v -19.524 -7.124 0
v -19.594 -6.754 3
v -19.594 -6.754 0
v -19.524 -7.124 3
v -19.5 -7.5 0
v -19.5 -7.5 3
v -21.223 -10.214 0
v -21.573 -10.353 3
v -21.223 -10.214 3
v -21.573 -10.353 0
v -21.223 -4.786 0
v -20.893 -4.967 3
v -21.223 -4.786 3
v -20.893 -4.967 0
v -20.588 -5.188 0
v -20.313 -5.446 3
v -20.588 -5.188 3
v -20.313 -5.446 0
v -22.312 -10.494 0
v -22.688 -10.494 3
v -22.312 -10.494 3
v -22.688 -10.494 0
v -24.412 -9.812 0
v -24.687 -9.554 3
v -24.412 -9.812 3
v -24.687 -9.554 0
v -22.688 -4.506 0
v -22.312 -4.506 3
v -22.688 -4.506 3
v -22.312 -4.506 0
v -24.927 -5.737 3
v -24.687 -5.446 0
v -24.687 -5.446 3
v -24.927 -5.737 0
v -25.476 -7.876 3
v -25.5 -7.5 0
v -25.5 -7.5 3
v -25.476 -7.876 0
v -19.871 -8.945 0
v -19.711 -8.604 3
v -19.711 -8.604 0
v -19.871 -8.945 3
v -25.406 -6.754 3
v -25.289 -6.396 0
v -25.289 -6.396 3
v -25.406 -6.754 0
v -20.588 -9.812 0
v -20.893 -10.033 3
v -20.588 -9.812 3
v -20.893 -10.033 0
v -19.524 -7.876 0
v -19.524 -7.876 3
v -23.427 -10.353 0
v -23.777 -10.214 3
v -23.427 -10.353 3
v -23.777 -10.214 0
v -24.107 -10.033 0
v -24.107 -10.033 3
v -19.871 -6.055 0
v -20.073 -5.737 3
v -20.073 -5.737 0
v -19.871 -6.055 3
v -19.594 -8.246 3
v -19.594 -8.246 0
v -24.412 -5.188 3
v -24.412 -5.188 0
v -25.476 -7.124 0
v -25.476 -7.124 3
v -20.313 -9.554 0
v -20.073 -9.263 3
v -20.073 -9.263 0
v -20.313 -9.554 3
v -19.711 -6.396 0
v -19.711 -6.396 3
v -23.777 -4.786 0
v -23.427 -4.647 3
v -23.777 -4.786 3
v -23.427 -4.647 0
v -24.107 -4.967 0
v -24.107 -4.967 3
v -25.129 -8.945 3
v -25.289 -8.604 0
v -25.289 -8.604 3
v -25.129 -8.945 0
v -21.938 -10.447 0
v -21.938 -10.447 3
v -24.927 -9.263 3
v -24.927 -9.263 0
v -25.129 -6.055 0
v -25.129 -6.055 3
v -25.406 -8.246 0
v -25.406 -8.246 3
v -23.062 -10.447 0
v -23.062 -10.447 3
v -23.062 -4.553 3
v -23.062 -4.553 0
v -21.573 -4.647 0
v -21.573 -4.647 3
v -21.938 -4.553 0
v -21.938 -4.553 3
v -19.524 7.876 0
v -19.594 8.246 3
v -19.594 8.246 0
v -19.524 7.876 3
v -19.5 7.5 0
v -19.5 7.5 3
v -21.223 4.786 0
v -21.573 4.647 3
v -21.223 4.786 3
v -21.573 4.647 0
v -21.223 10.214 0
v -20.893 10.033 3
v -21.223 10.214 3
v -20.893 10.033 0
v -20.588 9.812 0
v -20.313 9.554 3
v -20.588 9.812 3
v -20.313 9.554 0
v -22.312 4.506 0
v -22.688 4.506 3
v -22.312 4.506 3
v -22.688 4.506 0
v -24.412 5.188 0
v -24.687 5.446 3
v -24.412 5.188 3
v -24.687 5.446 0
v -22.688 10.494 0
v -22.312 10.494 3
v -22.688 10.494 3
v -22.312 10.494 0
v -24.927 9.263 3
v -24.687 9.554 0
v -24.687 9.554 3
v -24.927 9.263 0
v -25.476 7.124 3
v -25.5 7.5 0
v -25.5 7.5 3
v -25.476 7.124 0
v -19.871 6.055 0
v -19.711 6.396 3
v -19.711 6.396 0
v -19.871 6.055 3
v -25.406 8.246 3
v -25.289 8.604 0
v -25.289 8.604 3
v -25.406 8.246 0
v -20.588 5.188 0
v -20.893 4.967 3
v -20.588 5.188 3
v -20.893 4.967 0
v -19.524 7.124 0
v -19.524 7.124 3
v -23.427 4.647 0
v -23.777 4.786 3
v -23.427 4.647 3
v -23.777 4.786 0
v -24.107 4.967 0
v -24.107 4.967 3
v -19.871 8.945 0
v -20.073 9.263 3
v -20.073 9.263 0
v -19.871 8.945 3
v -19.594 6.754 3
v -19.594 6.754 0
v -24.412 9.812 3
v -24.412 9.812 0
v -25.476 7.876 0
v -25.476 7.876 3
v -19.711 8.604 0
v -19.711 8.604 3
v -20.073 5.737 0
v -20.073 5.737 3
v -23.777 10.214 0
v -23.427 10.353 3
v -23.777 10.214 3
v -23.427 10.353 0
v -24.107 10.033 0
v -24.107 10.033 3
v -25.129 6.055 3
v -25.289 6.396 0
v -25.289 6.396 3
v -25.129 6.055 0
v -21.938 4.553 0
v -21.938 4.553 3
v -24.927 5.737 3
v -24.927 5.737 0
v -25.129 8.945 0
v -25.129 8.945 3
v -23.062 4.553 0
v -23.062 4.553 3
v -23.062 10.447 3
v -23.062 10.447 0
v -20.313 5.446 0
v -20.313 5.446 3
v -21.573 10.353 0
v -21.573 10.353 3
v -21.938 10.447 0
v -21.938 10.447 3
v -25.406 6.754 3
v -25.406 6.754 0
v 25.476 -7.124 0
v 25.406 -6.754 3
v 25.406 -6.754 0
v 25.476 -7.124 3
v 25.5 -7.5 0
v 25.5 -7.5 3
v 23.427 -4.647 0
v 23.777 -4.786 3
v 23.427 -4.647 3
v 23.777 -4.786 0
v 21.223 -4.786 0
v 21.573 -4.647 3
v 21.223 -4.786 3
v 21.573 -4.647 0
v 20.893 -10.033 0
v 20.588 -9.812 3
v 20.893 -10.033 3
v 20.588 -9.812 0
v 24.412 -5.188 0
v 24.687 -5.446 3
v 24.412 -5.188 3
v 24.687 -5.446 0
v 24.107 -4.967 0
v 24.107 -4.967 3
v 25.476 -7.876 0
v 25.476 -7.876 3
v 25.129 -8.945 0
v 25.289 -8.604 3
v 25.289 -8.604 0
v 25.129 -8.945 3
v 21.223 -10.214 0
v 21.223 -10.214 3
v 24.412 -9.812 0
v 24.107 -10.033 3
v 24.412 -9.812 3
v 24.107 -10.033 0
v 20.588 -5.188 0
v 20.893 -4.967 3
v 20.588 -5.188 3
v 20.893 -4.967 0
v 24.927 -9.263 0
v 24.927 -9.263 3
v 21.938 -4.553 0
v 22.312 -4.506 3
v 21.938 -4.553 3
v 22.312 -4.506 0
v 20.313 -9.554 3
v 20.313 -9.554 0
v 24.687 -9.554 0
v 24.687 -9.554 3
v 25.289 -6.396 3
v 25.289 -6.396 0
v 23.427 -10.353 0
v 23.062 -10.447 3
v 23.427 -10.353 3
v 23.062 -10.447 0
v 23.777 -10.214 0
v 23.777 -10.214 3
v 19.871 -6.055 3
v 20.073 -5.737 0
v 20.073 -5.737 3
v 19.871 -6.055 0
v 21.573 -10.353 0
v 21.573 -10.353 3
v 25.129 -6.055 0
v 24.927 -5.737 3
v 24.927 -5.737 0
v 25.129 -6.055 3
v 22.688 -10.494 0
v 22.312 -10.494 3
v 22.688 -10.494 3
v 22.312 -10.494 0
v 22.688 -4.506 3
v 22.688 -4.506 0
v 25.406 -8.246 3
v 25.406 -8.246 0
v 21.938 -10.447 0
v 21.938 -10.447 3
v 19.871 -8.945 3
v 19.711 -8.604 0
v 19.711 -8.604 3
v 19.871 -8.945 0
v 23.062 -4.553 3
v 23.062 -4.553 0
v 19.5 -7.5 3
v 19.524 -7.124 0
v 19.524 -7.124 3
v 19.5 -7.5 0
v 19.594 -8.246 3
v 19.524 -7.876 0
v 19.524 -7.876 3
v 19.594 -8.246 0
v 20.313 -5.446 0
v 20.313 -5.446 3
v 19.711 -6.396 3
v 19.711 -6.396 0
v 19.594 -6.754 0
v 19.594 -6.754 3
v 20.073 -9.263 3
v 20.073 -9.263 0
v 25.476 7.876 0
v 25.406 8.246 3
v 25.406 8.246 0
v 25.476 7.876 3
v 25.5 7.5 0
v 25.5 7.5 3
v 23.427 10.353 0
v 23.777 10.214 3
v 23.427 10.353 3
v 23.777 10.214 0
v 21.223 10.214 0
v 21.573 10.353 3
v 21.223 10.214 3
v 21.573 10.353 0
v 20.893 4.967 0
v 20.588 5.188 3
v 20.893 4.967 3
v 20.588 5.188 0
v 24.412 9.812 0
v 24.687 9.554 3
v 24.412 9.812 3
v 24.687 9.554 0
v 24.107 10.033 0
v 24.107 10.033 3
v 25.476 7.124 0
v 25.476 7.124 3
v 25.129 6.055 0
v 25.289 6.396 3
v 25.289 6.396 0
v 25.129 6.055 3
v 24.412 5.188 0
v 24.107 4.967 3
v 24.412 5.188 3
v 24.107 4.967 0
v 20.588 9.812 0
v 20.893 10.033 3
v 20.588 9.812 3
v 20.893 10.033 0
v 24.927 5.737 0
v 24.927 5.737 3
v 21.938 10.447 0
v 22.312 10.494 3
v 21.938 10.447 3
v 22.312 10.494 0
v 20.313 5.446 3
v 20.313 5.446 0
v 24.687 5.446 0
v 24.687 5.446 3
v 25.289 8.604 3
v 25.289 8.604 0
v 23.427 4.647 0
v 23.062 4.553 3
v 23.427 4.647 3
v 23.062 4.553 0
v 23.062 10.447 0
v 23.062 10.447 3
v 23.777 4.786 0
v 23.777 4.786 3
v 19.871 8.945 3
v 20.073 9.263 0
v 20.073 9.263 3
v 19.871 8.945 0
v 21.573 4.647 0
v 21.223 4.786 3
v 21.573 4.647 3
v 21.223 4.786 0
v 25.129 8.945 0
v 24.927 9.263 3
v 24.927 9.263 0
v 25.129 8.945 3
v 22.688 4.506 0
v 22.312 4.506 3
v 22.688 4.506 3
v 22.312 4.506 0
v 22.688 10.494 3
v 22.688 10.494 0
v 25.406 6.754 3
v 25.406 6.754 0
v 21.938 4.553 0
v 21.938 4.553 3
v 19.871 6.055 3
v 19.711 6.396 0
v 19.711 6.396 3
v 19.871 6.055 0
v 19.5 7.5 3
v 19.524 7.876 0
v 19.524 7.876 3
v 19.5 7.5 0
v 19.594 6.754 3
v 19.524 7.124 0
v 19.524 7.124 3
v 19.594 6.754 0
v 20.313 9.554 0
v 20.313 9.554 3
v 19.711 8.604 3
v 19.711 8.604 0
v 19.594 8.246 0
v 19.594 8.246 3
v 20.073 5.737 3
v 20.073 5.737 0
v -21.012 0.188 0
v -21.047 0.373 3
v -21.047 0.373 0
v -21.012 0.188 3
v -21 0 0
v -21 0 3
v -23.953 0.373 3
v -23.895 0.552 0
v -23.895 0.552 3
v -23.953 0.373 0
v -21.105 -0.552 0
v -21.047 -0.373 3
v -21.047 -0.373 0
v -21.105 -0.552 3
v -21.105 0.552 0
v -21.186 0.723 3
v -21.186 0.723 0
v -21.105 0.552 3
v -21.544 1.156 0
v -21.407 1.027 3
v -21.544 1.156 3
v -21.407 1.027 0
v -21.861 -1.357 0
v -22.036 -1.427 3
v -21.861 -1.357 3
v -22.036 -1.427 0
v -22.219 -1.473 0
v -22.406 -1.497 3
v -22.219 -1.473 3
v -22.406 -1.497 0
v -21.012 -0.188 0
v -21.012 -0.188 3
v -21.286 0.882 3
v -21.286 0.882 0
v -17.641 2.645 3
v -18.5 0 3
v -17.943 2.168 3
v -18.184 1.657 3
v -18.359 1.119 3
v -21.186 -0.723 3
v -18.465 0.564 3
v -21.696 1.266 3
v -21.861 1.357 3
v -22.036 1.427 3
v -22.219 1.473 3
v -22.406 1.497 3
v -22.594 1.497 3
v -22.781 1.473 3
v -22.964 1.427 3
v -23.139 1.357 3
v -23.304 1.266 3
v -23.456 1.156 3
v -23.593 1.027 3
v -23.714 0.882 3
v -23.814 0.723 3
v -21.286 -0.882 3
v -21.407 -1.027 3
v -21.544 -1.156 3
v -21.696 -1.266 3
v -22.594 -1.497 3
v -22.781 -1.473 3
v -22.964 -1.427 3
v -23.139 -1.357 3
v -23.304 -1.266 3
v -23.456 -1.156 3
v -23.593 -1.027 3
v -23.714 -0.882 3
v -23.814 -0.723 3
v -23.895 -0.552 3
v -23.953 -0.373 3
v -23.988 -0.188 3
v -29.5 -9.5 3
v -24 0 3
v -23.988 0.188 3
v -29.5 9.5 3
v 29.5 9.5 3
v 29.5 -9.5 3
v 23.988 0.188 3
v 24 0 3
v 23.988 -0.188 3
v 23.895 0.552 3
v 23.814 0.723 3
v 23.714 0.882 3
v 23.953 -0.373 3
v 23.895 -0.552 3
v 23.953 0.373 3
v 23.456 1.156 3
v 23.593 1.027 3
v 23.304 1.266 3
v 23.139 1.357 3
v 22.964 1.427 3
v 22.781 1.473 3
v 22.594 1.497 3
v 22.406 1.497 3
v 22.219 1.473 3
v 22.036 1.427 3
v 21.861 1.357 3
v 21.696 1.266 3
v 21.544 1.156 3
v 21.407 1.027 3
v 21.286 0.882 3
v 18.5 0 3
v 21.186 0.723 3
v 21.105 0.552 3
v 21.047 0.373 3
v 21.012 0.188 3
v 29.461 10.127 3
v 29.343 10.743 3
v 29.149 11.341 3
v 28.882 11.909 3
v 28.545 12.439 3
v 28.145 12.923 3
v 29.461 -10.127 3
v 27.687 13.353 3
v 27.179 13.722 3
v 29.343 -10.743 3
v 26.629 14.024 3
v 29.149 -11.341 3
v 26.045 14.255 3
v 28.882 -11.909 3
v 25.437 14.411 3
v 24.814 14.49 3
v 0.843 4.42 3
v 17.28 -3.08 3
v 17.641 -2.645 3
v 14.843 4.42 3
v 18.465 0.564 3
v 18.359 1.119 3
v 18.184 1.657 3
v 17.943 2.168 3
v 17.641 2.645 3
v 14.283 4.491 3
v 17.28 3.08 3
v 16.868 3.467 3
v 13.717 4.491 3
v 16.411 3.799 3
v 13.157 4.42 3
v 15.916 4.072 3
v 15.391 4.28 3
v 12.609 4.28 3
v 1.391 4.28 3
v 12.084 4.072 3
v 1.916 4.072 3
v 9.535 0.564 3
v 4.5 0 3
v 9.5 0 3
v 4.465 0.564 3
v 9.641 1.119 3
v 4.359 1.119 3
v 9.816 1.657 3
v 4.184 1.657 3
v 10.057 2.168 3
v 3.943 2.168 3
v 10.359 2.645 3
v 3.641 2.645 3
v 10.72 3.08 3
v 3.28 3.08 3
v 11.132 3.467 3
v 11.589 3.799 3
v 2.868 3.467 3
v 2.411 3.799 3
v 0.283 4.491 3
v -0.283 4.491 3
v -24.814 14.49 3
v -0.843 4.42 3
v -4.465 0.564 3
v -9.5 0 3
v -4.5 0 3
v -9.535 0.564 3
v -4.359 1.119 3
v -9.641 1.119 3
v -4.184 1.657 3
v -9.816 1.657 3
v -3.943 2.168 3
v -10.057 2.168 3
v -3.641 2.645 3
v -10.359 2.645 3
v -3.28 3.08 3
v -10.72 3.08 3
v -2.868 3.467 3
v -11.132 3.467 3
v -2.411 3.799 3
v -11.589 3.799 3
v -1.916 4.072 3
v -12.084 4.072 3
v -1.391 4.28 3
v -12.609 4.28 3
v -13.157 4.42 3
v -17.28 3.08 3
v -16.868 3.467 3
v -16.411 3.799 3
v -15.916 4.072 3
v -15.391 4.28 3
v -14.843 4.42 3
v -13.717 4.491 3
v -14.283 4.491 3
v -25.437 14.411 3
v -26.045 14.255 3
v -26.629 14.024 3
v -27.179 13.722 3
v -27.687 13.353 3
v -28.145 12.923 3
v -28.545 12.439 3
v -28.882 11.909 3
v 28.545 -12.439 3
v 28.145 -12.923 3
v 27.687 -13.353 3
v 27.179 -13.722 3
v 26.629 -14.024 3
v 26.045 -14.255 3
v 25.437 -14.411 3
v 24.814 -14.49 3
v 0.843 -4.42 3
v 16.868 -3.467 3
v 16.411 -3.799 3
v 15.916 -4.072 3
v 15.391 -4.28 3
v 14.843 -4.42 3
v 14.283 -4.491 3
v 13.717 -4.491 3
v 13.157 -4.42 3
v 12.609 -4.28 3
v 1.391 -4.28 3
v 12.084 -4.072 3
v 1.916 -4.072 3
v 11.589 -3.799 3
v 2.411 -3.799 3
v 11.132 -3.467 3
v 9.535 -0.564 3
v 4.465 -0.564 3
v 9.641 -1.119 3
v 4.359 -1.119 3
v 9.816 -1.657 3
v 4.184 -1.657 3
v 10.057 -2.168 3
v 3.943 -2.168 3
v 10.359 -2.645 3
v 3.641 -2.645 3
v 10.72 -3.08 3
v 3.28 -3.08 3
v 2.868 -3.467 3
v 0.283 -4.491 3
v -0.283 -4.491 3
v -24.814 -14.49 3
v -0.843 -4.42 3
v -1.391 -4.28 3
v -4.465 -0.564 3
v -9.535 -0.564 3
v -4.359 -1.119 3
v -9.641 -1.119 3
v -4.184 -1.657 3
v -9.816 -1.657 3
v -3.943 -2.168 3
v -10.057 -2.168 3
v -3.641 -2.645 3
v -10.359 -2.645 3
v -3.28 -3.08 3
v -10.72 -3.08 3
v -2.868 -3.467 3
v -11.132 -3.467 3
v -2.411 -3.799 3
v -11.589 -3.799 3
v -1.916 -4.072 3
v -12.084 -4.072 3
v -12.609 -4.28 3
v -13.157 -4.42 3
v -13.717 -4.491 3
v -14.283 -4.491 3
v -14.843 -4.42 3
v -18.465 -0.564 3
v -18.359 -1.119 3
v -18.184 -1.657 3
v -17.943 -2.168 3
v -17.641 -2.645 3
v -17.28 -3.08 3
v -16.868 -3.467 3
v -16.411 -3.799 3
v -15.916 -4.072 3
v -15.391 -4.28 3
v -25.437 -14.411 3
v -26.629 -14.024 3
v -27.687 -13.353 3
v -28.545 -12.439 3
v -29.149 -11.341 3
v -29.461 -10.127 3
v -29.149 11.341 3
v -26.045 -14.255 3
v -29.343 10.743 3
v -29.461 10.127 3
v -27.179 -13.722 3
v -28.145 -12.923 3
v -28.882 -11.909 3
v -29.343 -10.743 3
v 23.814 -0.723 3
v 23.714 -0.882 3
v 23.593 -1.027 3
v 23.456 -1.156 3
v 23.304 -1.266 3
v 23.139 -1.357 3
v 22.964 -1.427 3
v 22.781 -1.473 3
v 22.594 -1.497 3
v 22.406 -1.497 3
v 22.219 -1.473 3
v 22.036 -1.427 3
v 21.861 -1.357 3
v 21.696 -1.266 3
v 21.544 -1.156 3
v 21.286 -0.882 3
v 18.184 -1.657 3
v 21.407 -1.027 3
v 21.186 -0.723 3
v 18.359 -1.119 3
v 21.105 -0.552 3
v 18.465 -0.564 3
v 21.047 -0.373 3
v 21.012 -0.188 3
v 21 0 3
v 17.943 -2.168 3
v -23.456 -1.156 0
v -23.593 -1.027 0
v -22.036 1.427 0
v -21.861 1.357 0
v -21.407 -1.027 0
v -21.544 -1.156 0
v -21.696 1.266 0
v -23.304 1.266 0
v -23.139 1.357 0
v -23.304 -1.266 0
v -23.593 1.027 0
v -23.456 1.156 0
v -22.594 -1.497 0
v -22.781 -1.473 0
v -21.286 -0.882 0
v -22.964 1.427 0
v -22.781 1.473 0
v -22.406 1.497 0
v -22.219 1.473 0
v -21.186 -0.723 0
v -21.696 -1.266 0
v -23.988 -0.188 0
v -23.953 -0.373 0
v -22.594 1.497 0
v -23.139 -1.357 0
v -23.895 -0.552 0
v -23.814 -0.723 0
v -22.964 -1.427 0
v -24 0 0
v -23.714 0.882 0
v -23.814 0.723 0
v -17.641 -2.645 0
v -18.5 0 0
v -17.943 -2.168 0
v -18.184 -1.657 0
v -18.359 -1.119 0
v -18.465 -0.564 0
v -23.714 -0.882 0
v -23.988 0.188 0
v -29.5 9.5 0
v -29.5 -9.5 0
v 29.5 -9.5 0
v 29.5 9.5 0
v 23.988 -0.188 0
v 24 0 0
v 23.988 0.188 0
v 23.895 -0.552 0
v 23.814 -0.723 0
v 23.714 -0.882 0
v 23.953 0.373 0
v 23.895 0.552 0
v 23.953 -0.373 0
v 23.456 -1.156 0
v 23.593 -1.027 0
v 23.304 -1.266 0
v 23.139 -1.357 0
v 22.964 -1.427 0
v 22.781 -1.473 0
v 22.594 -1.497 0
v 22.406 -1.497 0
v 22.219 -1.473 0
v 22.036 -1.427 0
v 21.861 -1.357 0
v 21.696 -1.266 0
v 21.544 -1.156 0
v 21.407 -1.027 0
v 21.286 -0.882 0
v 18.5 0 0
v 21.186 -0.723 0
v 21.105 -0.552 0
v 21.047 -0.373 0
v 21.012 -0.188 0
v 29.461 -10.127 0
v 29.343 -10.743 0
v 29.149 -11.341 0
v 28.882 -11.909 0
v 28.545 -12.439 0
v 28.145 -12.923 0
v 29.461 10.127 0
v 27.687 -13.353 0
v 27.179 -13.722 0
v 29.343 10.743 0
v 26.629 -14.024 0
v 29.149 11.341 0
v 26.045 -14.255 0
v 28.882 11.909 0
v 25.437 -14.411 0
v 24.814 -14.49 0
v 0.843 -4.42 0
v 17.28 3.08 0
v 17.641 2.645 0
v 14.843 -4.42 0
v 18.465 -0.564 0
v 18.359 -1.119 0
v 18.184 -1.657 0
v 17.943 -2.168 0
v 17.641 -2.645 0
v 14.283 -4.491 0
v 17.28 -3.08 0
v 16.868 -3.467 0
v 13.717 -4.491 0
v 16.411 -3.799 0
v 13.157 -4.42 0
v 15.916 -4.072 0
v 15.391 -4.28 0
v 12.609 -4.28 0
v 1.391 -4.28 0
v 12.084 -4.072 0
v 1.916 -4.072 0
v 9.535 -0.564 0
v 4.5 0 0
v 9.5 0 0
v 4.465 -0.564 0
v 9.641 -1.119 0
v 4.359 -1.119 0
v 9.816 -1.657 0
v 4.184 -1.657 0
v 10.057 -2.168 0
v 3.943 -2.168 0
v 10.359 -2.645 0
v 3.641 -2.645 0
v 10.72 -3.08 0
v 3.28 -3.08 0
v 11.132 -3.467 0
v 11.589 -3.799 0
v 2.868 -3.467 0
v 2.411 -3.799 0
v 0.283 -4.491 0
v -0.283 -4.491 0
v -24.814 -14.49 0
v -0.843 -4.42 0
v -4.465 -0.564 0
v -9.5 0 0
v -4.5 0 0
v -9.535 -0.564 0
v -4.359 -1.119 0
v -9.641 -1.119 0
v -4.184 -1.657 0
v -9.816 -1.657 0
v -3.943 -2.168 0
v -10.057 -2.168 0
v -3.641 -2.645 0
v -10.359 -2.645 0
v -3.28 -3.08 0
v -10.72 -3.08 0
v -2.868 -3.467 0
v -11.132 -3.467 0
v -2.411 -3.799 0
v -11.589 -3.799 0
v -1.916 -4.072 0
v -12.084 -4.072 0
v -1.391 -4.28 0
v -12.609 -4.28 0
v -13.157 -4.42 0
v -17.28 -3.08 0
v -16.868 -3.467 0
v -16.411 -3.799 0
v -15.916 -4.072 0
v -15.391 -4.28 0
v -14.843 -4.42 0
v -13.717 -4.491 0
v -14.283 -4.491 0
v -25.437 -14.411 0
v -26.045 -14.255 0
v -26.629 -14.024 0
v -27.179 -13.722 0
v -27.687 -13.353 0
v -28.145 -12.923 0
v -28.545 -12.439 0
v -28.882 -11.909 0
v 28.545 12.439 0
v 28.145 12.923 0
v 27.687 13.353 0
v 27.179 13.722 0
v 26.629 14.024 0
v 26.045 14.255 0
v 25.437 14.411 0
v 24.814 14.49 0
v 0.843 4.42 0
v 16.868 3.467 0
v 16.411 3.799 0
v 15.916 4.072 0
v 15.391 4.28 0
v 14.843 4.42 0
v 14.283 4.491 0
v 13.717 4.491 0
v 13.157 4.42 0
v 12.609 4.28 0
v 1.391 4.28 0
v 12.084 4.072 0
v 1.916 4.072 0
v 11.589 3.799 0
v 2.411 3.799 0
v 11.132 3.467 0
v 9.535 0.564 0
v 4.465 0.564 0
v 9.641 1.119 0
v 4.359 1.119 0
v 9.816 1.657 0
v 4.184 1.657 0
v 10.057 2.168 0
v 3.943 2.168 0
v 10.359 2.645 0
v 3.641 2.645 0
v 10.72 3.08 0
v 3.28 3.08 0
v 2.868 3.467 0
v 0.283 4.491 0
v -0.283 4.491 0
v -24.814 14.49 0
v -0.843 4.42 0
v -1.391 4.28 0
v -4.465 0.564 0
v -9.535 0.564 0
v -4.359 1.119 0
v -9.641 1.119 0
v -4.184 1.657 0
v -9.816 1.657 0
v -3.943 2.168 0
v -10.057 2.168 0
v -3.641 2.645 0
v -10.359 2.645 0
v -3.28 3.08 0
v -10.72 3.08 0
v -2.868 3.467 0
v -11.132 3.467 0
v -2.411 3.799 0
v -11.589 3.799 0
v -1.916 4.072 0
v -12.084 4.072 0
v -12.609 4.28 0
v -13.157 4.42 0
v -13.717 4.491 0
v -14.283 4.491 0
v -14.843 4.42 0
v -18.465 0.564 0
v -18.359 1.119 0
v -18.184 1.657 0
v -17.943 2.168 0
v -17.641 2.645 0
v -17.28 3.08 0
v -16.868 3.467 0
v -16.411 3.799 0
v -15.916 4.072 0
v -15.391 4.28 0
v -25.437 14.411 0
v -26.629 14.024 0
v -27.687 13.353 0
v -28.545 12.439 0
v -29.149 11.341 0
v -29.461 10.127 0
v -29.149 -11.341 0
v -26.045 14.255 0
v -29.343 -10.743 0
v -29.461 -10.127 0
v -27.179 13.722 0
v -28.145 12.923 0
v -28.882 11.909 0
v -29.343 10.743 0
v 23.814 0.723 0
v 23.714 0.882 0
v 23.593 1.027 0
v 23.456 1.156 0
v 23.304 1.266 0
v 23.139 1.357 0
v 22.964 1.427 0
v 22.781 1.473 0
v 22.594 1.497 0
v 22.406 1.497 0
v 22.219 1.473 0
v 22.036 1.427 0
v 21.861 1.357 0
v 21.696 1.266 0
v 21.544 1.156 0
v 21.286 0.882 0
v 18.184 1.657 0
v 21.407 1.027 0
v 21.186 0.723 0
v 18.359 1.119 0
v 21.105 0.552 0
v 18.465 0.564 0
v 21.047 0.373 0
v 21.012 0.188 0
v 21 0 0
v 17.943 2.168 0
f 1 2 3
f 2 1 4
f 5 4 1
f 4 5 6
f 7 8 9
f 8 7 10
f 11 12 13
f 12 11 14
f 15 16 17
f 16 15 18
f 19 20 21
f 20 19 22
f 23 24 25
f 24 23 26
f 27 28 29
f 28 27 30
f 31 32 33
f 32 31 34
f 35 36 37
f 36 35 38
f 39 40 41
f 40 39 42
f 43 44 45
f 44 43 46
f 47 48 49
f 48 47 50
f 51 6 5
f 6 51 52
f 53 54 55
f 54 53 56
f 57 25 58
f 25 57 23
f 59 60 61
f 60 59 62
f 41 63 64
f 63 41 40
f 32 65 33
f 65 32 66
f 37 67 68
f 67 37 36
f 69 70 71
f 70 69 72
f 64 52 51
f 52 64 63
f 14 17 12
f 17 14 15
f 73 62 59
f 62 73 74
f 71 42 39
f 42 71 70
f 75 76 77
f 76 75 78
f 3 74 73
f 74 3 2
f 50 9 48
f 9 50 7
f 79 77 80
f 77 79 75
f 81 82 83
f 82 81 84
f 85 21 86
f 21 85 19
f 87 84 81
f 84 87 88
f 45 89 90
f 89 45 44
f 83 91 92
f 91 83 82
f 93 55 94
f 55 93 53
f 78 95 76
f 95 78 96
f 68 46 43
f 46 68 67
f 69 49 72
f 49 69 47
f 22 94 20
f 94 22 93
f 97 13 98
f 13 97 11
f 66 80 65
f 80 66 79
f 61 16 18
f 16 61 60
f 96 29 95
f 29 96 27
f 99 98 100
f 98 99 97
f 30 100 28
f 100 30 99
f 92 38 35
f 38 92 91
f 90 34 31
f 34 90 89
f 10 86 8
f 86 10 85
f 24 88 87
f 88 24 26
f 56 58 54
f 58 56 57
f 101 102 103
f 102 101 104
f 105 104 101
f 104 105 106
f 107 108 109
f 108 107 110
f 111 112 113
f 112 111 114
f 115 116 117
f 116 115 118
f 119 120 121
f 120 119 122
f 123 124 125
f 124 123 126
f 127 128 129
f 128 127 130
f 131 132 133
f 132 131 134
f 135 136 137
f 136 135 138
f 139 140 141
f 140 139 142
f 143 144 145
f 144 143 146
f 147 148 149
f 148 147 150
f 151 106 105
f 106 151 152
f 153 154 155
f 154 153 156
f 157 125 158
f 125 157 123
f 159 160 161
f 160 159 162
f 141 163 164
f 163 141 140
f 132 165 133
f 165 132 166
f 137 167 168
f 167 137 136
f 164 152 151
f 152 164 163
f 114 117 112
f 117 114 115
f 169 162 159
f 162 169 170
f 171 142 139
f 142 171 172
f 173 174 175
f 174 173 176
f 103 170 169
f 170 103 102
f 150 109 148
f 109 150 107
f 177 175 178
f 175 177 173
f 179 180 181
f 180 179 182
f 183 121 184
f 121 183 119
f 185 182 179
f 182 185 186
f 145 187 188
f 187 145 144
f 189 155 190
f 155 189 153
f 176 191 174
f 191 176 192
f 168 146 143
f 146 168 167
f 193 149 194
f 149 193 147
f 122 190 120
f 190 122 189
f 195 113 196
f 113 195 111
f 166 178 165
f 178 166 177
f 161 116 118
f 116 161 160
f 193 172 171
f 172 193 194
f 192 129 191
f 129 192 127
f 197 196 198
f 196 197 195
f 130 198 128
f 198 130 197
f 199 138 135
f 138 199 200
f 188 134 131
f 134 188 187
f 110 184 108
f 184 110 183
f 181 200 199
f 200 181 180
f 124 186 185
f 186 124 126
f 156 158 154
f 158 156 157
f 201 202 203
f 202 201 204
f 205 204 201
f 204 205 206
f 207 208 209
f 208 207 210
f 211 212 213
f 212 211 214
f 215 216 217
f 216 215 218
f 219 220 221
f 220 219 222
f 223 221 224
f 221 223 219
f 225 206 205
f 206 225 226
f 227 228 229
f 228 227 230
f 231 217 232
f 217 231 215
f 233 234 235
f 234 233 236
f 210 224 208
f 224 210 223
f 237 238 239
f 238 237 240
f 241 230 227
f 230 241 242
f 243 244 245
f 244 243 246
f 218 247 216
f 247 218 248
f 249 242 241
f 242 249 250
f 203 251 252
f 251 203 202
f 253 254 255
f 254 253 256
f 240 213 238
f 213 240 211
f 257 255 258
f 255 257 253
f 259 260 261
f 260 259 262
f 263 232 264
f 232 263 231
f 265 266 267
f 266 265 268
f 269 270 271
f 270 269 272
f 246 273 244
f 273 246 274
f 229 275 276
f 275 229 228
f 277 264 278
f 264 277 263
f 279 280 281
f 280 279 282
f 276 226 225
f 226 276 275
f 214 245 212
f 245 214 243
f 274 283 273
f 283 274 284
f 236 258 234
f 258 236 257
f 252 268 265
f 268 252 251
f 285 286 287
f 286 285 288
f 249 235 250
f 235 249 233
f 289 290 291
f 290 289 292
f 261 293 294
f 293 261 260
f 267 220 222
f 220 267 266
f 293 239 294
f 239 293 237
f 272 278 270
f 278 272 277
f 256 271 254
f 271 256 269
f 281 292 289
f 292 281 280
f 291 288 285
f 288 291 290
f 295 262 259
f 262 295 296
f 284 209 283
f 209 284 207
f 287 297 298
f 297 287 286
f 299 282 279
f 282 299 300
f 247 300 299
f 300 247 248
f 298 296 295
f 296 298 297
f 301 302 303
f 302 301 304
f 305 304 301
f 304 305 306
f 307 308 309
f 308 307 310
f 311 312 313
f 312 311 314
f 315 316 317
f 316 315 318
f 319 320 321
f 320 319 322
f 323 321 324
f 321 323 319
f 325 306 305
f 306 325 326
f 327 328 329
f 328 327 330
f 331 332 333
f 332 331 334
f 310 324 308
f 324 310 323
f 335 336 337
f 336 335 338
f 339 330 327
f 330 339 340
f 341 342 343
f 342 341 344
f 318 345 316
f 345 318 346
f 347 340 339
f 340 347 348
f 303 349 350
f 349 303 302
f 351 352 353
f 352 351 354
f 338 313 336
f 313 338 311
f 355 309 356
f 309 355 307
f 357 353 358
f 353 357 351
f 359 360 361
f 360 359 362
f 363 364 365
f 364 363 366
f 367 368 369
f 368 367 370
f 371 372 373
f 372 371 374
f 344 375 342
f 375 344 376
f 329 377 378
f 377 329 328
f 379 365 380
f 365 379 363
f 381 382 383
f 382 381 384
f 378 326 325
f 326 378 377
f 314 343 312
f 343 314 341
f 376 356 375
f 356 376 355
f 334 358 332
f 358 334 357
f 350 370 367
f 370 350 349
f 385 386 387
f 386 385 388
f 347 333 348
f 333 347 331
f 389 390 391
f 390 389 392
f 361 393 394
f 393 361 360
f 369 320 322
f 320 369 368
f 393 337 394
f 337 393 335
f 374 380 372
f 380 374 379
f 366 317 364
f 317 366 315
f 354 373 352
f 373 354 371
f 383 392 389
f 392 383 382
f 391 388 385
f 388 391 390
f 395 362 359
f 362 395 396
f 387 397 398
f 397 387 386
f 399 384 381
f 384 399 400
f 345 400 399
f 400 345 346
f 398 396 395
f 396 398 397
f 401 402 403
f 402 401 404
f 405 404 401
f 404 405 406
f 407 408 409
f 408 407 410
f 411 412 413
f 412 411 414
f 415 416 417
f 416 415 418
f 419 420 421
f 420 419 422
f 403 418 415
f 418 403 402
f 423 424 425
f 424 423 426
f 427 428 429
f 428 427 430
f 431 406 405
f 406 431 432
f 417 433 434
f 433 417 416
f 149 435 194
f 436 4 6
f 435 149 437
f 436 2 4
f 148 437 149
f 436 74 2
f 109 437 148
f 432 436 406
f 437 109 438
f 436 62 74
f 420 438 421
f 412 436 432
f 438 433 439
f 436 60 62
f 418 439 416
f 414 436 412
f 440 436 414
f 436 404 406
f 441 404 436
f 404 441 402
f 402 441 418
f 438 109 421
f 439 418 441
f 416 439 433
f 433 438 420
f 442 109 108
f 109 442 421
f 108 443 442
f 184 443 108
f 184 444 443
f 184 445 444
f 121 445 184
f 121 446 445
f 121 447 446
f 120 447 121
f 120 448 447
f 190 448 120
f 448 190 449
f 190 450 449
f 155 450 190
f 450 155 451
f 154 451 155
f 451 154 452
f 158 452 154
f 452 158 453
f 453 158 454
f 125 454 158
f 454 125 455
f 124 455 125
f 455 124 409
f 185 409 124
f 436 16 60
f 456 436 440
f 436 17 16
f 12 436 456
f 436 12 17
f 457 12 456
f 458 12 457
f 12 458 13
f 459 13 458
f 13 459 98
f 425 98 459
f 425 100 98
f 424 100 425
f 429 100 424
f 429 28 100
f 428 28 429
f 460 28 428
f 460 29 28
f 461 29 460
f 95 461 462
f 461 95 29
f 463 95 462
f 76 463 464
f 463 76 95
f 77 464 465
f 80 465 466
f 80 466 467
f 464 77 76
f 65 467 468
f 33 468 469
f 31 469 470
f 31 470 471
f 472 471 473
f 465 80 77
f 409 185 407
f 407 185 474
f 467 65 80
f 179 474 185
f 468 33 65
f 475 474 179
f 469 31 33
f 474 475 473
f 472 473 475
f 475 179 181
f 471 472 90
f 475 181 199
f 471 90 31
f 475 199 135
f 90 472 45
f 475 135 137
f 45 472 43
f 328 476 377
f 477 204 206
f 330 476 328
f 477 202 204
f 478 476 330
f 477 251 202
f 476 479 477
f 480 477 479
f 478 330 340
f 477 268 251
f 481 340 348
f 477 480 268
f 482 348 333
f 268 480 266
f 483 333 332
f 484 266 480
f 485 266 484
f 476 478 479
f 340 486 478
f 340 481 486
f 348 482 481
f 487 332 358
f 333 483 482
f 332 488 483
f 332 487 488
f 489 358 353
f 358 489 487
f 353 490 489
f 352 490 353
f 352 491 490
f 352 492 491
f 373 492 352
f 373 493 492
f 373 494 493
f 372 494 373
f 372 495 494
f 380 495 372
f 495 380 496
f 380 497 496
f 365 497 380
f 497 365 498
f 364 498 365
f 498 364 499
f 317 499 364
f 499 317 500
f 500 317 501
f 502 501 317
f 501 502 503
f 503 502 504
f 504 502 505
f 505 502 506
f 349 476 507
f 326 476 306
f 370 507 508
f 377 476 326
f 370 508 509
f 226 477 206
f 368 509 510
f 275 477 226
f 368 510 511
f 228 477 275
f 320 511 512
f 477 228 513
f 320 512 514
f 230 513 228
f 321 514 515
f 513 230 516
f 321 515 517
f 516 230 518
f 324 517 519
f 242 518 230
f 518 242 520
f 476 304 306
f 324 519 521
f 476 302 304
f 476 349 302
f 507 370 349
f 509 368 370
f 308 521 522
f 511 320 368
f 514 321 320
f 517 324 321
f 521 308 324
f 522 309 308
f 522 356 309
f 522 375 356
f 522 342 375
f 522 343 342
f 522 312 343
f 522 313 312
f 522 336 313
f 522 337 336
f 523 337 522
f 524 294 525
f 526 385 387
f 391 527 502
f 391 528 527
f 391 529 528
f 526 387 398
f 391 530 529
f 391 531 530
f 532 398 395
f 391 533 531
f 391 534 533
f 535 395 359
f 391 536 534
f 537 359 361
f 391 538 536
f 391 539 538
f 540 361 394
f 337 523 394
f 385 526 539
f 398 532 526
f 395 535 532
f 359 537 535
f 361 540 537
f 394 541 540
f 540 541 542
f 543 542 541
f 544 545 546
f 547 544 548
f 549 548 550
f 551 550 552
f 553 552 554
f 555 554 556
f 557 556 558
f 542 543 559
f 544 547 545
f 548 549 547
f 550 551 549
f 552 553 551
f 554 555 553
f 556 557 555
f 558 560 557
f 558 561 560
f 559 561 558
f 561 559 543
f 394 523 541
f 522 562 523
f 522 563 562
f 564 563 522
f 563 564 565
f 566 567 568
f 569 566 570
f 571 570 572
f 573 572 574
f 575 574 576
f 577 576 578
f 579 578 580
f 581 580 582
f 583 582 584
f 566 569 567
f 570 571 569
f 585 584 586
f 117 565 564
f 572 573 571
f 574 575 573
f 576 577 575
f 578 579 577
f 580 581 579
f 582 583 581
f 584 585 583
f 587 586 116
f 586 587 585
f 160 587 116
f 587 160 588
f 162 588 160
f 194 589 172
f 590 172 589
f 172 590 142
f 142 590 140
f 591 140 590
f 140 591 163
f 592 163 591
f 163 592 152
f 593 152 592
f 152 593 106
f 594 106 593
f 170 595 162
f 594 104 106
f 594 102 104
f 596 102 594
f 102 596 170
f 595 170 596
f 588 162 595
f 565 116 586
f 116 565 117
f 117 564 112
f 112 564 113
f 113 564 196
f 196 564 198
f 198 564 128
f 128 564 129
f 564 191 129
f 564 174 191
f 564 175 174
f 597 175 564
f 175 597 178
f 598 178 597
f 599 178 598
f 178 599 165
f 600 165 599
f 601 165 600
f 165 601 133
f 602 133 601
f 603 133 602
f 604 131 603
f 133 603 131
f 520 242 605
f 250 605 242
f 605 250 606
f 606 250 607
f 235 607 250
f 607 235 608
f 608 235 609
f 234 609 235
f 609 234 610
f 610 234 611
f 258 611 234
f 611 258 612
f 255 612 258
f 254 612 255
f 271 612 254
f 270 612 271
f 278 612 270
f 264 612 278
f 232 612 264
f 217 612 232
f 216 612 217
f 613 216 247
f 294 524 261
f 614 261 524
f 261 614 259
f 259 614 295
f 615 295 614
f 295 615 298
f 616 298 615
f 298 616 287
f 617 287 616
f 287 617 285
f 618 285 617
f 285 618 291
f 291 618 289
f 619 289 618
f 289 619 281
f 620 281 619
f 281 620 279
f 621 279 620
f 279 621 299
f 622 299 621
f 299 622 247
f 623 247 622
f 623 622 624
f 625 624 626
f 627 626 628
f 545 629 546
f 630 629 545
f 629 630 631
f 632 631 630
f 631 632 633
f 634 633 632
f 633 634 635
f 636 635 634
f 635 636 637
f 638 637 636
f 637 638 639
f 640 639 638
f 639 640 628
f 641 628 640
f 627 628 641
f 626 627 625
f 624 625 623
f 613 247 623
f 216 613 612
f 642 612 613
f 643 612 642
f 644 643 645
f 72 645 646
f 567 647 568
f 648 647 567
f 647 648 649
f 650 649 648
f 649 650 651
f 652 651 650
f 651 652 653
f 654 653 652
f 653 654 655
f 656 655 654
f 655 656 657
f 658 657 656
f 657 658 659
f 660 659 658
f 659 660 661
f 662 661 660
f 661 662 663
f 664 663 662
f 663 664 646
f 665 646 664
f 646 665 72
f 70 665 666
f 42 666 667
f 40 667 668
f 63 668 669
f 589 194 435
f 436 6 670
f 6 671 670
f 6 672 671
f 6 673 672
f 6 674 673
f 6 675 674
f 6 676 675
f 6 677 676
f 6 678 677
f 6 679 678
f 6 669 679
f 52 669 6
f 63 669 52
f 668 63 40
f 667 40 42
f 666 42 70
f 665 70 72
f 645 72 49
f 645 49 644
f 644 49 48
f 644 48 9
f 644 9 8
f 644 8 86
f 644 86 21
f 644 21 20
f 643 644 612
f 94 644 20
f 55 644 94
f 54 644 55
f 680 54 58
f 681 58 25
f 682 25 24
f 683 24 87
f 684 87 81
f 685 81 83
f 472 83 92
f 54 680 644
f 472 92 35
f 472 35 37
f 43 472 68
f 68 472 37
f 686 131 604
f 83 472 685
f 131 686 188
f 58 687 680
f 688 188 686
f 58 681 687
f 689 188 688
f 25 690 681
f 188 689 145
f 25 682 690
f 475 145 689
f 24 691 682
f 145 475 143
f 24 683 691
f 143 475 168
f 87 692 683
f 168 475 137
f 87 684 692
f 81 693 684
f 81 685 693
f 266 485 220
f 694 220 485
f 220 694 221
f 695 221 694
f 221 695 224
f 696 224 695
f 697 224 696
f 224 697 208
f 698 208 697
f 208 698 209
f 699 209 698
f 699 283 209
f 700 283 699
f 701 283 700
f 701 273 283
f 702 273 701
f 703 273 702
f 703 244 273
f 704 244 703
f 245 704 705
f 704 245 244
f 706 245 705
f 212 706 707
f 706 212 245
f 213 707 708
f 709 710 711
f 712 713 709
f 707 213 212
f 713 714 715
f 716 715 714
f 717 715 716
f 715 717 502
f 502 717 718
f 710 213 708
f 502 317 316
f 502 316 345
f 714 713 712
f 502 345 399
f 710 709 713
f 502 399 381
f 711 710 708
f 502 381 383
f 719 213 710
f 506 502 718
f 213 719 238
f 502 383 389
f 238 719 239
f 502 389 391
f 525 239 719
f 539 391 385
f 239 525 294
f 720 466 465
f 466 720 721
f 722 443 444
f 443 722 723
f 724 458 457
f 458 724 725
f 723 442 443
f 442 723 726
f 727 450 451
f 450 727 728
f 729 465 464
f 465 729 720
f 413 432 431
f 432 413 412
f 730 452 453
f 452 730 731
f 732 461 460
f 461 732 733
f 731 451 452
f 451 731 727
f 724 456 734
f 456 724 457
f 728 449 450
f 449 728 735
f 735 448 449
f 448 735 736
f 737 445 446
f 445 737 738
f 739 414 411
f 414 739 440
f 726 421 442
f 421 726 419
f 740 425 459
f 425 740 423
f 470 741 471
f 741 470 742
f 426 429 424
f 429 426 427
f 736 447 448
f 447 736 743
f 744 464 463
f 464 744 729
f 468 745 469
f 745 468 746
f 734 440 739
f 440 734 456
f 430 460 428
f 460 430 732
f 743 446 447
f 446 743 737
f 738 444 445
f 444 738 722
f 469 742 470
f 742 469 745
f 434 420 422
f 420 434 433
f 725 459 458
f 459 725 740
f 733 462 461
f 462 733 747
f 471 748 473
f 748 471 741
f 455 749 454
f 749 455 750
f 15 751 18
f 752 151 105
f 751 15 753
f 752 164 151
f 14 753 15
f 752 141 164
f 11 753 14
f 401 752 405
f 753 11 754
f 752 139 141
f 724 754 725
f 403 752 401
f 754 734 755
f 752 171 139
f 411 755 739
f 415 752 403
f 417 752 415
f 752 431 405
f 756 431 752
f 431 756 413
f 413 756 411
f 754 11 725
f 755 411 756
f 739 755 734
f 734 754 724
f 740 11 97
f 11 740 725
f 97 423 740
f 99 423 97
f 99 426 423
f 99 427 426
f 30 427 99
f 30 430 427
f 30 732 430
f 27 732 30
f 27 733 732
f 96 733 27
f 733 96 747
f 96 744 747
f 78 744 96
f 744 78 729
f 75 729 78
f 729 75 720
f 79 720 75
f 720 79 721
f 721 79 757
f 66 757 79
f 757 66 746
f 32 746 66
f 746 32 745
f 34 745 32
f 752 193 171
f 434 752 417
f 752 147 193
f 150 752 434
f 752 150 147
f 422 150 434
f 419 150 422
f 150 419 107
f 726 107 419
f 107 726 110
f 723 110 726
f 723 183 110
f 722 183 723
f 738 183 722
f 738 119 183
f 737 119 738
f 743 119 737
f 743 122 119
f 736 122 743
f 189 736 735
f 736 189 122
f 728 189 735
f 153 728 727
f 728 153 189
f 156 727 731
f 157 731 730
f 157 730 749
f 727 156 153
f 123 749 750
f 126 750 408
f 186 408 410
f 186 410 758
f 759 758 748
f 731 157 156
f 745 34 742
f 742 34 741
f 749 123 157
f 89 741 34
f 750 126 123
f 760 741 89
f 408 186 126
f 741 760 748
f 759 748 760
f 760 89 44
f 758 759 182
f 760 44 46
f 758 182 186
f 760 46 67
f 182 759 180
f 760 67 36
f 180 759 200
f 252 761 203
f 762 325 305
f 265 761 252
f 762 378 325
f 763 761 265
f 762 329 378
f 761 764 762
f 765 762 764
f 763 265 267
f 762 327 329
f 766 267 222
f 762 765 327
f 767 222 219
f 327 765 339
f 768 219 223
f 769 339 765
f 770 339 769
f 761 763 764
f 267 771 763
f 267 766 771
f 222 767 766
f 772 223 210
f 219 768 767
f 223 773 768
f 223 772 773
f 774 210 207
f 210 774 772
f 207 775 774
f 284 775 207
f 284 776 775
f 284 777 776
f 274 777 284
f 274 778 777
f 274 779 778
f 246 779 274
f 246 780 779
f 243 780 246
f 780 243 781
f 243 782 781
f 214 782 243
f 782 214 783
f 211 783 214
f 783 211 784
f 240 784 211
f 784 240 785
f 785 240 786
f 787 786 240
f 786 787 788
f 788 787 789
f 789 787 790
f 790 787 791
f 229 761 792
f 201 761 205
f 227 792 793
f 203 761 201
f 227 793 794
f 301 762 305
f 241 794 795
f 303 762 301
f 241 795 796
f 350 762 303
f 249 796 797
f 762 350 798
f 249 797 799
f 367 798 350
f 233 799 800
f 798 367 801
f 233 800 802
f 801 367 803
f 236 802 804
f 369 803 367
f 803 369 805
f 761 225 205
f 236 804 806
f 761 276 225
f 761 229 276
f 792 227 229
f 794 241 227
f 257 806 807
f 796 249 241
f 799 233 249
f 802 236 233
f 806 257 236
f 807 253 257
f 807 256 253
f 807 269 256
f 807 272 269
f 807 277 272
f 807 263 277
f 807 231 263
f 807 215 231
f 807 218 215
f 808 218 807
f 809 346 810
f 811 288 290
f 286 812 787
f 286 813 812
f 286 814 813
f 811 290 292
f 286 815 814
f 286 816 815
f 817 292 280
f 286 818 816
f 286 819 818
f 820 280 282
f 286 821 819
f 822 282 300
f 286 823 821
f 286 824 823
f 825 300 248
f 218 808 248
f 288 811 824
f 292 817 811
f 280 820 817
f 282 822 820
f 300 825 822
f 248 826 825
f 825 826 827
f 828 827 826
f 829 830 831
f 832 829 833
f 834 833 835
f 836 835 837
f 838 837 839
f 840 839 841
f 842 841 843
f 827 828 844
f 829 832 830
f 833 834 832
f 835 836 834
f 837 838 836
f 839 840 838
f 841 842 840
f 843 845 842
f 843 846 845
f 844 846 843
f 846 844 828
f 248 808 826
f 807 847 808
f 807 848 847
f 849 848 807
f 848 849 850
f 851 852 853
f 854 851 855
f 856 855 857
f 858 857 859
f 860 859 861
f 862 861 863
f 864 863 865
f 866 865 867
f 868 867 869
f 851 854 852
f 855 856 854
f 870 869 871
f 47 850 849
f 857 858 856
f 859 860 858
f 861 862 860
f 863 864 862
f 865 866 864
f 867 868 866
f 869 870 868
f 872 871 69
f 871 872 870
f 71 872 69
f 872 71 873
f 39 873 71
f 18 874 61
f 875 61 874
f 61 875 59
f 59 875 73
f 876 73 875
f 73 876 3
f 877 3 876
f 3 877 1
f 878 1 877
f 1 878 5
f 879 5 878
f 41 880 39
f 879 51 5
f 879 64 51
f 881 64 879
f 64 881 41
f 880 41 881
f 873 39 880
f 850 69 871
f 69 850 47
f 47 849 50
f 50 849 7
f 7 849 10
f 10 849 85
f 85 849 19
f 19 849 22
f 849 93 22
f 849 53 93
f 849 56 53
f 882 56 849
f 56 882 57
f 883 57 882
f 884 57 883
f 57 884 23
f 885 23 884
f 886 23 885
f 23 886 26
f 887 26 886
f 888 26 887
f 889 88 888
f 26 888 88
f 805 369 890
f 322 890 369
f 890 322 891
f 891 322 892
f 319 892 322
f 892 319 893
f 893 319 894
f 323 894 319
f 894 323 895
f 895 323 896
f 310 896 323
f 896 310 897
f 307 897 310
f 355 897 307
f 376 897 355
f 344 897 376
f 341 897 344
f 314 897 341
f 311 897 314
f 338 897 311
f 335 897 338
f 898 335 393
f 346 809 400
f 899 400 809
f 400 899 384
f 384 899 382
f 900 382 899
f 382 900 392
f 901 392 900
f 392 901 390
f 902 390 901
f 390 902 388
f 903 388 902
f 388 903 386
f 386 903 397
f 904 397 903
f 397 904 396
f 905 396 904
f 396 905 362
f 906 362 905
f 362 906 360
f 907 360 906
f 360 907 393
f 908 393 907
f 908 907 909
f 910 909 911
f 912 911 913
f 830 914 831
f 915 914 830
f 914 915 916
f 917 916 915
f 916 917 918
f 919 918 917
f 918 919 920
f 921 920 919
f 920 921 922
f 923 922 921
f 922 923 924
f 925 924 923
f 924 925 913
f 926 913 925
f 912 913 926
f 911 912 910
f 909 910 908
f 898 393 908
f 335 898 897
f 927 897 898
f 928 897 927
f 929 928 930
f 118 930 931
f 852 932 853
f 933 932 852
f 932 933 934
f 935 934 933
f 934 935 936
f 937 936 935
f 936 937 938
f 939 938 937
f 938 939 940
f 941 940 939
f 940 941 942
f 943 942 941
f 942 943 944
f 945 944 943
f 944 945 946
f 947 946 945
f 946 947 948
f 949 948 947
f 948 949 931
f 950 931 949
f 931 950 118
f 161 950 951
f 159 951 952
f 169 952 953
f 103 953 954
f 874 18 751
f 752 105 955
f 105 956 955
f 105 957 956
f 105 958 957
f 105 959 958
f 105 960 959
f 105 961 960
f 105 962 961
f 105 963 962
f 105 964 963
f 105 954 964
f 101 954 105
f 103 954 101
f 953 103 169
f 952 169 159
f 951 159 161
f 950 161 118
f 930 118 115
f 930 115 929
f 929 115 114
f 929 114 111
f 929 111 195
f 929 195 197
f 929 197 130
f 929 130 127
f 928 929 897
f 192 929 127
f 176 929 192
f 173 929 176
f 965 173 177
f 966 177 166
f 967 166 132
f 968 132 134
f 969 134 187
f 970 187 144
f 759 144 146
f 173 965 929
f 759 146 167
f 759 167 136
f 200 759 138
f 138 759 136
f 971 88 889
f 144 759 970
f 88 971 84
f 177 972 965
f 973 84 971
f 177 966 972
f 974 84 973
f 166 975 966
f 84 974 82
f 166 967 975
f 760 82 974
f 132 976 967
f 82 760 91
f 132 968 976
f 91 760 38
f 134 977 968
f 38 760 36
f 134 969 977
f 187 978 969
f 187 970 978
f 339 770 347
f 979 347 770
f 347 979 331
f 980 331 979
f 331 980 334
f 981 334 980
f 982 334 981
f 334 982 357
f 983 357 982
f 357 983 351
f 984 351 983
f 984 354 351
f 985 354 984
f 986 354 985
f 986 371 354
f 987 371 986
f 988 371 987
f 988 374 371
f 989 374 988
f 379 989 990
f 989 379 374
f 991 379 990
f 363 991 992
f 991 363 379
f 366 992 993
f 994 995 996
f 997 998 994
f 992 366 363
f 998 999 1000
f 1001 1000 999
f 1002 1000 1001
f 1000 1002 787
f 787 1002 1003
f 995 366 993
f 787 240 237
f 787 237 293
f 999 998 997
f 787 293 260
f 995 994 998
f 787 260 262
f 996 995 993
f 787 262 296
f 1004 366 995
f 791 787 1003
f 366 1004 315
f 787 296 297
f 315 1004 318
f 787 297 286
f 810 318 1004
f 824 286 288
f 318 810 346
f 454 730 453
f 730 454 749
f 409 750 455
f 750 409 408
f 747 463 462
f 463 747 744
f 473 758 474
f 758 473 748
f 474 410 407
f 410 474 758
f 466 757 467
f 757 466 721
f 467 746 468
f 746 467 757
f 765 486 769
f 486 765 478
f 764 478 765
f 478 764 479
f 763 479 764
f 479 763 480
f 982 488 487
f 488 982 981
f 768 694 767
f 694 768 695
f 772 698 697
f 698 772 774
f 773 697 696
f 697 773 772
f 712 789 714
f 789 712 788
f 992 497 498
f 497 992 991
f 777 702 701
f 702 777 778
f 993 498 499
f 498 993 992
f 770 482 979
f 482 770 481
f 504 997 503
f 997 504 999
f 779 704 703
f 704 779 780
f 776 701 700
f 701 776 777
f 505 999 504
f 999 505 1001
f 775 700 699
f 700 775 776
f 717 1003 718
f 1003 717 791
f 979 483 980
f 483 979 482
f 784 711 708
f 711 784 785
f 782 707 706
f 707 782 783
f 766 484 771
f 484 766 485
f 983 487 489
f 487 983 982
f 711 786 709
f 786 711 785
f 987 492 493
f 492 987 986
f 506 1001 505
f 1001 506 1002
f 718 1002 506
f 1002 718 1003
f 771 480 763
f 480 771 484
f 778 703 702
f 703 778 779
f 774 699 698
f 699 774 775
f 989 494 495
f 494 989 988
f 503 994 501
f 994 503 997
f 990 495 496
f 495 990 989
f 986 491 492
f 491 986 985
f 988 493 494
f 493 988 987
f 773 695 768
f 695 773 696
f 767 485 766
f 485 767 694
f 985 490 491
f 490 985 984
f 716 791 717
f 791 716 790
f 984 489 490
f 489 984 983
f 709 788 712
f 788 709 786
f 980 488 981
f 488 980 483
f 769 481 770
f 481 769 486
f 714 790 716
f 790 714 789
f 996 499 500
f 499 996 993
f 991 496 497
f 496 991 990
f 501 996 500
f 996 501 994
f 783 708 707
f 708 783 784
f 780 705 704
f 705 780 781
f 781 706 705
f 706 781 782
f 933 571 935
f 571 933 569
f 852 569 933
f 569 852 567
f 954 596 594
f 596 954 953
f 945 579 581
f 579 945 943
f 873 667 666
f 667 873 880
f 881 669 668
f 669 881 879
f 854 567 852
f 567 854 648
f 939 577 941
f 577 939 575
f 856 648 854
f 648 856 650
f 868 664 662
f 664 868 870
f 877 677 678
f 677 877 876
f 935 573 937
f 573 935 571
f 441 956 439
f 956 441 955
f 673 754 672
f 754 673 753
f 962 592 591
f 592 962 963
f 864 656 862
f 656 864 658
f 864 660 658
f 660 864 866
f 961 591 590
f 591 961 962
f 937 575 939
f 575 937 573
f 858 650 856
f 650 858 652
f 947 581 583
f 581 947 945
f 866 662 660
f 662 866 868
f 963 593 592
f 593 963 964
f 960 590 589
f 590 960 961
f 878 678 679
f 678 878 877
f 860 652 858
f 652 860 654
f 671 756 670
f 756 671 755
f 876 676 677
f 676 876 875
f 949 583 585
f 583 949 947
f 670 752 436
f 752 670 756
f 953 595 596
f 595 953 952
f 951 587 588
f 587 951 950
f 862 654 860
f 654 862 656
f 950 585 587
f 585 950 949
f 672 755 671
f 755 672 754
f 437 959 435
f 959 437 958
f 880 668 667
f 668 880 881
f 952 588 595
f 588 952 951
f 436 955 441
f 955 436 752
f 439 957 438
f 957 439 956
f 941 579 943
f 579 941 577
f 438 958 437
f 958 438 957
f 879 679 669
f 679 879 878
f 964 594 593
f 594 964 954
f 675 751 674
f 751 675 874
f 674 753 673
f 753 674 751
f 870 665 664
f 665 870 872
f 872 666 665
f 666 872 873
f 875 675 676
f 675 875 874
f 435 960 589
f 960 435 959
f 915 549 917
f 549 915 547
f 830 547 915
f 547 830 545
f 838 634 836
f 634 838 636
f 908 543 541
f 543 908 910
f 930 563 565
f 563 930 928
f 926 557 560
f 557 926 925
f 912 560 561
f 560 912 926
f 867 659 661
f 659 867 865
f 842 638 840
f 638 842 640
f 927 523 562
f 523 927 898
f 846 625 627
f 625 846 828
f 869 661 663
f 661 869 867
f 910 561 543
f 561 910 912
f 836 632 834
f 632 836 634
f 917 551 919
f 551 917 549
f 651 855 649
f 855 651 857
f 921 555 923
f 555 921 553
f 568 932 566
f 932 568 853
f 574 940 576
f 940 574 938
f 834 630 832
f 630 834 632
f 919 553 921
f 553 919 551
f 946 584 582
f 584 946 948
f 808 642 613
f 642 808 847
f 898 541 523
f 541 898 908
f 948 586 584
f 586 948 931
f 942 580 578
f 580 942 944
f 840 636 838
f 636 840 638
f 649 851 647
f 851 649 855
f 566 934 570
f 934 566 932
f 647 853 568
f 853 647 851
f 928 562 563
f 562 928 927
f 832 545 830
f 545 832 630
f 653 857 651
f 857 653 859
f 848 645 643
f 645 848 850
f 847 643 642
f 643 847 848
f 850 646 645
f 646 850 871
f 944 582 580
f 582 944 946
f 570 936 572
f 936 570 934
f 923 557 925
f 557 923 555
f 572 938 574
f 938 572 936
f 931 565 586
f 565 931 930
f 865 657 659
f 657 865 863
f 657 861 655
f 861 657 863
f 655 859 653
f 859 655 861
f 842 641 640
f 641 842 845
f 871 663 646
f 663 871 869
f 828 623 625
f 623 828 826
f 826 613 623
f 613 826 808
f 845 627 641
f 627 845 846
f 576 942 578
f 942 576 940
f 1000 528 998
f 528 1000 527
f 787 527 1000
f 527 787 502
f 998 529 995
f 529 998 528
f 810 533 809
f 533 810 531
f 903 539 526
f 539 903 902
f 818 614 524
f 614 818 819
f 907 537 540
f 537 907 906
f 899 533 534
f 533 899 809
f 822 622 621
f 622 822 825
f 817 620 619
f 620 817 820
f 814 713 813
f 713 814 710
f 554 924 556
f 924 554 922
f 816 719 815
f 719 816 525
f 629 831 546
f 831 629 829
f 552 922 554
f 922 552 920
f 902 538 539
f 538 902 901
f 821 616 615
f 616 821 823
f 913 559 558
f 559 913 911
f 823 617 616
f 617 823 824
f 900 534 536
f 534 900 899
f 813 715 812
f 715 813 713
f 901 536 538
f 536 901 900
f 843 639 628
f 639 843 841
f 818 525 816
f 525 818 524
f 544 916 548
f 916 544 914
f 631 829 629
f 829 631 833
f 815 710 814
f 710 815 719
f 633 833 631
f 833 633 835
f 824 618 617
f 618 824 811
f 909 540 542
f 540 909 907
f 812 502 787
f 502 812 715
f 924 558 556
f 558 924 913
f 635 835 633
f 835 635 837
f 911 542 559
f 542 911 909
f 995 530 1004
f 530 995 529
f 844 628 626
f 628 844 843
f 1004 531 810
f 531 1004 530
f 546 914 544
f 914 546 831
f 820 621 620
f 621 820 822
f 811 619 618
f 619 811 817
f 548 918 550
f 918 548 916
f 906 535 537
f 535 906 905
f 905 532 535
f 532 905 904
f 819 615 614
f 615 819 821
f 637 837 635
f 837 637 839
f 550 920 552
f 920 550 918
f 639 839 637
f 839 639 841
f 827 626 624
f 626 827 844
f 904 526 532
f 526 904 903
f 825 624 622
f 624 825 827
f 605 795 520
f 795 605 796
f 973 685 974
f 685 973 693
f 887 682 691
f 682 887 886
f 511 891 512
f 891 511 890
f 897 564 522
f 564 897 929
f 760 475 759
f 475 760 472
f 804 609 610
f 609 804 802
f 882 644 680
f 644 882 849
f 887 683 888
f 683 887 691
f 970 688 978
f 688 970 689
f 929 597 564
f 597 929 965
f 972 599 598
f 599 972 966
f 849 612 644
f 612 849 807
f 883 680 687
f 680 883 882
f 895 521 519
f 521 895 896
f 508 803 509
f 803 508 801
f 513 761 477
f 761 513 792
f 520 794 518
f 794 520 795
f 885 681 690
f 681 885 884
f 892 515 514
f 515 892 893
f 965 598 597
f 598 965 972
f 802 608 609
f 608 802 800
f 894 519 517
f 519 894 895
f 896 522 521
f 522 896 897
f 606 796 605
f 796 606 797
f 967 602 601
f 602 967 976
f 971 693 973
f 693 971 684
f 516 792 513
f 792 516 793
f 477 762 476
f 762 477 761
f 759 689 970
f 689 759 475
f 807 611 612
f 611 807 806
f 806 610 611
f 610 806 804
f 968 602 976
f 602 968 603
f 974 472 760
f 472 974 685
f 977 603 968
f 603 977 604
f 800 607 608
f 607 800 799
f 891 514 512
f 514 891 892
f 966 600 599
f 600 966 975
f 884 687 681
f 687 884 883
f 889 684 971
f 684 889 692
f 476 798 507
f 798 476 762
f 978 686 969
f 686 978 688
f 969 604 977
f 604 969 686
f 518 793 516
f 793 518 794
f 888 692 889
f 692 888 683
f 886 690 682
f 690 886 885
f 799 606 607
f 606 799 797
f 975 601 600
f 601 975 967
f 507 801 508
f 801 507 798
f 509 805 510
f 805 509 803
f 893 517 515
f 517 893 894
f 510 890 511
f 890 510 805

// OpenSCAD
$fn = 50;


difference() {
	union() {
		hull() {
			translate(v = [-24.5000000000, 9.5000000000, 0]) {
				cylinder(h = 3, r = 5);
			}
			translate(v = [24.5000000000, 9.5000000000, 0]) {
				cylinder(h = 3, r = 5);
			}
			translate(v = [-24.5000000000, -9.5000000000, 0]) {
				cylinder(h = 3, r = 5);
			}
			translate(v = [24.5000000000, -9.5000000000, 0]) {
				cylinder(h = 3, r = 5);
			}
		}
	}
	union() {
		#translate(v = [-22.5000000000, -7.5000000000, 0]) {
			cylinder(h = 3, r = 3.0000000000);
		}
		#translate(v = [-22.5000000000, 7.5000000000, 0]) {
			cylinder(h = 3, r = 3.0000000000);
		}
		#translate(v = [22.5000000000, -7.5000000000, 0]) {
			cylinder(h = 3, r = 3.0000000000);
		}
		#translate(v = [22.5000000000, 7.5000000000, 0]) {
			cylinder(h = 3, r = 3.0000000000);
		}
		#translate(v = [-22.5000000000, -7.5000000000, -100.0000000000]) {
			cylinder(h = 200, r = 3.0000000000);
		}
		#translate(v = [-22.5000000000, 7.5000000000, -100.0000000000]) {
			cylinder(h = 200, r = 3.0000000000);
		}
		#translate(v = [22.5000000000, -7.5000000000, -100.0000000000]) {
			cylinder(h = 200, r = 3.0000000000);
		}
		#translate(v = [22.5000000000, 7.5000000000, -100.0000000000]) {
			cylinder(h = 200, r = 3.0000000000);
		}
		#translate(v = [-22.5000000000, -7.5000000000, 0]) {
			cylinder(h = 3, r = 1.5000000000);
		}
		#translate(v = [-22.5000000000, 0.0000000000, 0]) {
			cylinder(h = 3, r = 1.5000000000);
		}
		#translate(v = [-22.5000000000, 7.5000000000, 0]) {
			cylinder(h = 3, r = 1.5000000000);
		}
		#translate(v = [22.5000000000, -7.5000000000, 0]) {
			cylinder(h = 3, r = 1.5000000000);
		}
		#translate(v = [22.5000000000, 0.0000000000, 0]) {
			cylinder(h = 3, r = 1.5000000000);
		}
		#translate(v = [22.5000000000, 7.5000000000, 0]) {
			cylinder(h = 3, r = 1.5000000000);
		}
		#translate(v = [-22.5000000000, -7.5000000000, 0]) {
			cylinder(h = 3, r = 1.5000000000);
		}
		#translate(v = [-22.5000000000, 0.0000000000, 0]) {
			cylinder(h = 3, r = 1.5000000000);
		}
		#translate(v = [-22.5000000000, 7.5000000000, 0]) {
			cylinder(h = 3, r = 1.5000000000);
		}
		#translate(v = [22.5000000000, -7.5000000000, 0]) {
			cylinder(h = 3, r = 1.5000000000);
		}
		#translate(v = [22.5000000000, 0.0000000000, 0]) {
			cylinder(h = 3, r = 1.5000000000);
		}
		#translate(v = [22.5000000000, 7.5000000000, 0]) {
			cylinder(h = 3, r = 1.5000000000);
		}
		#translate(v = [-22.5000000000, -7.5000000000, 0]) {
			cylinder(h = 3, r = 1.5000000000);
		}
		#translate(v = [-22.5000000000, 0.0000000000, 0]) {
			cylinder(h = 3, r = 1.5000000000);
		}
		#translate(v = [-22.5000000000, 7.5000000000, 0]) {
			cylinder(h = 3, r = 1.5000000000);
		}
		#translate(v = [22.5000000000, -7.5000000000, 0]) {
			cylinder(h = 3, r = 1.5000000000);
		}
		#translate(v = [22.5000000000, 0.0000000000, 0]) {
			cylinder(h = 3, r = 1.5000000000);
		}
		#translate(v = [22.5000000000, 7.5000000000, 0]) {
			cylinder(h = 3, r = 1.5000000000);
		}
		#translate(v = [-14.0000000000, 0, 0]) {
			cylinder(h = 3, r = 4.5000000000);
		}
		#cylinder(h = 3, r = 4.5000000000);
		#translate(v = [14.0000000000, 0, 0]) {
			cylinder(h = 3, r = 4.5000000000);
		}
	}
}
